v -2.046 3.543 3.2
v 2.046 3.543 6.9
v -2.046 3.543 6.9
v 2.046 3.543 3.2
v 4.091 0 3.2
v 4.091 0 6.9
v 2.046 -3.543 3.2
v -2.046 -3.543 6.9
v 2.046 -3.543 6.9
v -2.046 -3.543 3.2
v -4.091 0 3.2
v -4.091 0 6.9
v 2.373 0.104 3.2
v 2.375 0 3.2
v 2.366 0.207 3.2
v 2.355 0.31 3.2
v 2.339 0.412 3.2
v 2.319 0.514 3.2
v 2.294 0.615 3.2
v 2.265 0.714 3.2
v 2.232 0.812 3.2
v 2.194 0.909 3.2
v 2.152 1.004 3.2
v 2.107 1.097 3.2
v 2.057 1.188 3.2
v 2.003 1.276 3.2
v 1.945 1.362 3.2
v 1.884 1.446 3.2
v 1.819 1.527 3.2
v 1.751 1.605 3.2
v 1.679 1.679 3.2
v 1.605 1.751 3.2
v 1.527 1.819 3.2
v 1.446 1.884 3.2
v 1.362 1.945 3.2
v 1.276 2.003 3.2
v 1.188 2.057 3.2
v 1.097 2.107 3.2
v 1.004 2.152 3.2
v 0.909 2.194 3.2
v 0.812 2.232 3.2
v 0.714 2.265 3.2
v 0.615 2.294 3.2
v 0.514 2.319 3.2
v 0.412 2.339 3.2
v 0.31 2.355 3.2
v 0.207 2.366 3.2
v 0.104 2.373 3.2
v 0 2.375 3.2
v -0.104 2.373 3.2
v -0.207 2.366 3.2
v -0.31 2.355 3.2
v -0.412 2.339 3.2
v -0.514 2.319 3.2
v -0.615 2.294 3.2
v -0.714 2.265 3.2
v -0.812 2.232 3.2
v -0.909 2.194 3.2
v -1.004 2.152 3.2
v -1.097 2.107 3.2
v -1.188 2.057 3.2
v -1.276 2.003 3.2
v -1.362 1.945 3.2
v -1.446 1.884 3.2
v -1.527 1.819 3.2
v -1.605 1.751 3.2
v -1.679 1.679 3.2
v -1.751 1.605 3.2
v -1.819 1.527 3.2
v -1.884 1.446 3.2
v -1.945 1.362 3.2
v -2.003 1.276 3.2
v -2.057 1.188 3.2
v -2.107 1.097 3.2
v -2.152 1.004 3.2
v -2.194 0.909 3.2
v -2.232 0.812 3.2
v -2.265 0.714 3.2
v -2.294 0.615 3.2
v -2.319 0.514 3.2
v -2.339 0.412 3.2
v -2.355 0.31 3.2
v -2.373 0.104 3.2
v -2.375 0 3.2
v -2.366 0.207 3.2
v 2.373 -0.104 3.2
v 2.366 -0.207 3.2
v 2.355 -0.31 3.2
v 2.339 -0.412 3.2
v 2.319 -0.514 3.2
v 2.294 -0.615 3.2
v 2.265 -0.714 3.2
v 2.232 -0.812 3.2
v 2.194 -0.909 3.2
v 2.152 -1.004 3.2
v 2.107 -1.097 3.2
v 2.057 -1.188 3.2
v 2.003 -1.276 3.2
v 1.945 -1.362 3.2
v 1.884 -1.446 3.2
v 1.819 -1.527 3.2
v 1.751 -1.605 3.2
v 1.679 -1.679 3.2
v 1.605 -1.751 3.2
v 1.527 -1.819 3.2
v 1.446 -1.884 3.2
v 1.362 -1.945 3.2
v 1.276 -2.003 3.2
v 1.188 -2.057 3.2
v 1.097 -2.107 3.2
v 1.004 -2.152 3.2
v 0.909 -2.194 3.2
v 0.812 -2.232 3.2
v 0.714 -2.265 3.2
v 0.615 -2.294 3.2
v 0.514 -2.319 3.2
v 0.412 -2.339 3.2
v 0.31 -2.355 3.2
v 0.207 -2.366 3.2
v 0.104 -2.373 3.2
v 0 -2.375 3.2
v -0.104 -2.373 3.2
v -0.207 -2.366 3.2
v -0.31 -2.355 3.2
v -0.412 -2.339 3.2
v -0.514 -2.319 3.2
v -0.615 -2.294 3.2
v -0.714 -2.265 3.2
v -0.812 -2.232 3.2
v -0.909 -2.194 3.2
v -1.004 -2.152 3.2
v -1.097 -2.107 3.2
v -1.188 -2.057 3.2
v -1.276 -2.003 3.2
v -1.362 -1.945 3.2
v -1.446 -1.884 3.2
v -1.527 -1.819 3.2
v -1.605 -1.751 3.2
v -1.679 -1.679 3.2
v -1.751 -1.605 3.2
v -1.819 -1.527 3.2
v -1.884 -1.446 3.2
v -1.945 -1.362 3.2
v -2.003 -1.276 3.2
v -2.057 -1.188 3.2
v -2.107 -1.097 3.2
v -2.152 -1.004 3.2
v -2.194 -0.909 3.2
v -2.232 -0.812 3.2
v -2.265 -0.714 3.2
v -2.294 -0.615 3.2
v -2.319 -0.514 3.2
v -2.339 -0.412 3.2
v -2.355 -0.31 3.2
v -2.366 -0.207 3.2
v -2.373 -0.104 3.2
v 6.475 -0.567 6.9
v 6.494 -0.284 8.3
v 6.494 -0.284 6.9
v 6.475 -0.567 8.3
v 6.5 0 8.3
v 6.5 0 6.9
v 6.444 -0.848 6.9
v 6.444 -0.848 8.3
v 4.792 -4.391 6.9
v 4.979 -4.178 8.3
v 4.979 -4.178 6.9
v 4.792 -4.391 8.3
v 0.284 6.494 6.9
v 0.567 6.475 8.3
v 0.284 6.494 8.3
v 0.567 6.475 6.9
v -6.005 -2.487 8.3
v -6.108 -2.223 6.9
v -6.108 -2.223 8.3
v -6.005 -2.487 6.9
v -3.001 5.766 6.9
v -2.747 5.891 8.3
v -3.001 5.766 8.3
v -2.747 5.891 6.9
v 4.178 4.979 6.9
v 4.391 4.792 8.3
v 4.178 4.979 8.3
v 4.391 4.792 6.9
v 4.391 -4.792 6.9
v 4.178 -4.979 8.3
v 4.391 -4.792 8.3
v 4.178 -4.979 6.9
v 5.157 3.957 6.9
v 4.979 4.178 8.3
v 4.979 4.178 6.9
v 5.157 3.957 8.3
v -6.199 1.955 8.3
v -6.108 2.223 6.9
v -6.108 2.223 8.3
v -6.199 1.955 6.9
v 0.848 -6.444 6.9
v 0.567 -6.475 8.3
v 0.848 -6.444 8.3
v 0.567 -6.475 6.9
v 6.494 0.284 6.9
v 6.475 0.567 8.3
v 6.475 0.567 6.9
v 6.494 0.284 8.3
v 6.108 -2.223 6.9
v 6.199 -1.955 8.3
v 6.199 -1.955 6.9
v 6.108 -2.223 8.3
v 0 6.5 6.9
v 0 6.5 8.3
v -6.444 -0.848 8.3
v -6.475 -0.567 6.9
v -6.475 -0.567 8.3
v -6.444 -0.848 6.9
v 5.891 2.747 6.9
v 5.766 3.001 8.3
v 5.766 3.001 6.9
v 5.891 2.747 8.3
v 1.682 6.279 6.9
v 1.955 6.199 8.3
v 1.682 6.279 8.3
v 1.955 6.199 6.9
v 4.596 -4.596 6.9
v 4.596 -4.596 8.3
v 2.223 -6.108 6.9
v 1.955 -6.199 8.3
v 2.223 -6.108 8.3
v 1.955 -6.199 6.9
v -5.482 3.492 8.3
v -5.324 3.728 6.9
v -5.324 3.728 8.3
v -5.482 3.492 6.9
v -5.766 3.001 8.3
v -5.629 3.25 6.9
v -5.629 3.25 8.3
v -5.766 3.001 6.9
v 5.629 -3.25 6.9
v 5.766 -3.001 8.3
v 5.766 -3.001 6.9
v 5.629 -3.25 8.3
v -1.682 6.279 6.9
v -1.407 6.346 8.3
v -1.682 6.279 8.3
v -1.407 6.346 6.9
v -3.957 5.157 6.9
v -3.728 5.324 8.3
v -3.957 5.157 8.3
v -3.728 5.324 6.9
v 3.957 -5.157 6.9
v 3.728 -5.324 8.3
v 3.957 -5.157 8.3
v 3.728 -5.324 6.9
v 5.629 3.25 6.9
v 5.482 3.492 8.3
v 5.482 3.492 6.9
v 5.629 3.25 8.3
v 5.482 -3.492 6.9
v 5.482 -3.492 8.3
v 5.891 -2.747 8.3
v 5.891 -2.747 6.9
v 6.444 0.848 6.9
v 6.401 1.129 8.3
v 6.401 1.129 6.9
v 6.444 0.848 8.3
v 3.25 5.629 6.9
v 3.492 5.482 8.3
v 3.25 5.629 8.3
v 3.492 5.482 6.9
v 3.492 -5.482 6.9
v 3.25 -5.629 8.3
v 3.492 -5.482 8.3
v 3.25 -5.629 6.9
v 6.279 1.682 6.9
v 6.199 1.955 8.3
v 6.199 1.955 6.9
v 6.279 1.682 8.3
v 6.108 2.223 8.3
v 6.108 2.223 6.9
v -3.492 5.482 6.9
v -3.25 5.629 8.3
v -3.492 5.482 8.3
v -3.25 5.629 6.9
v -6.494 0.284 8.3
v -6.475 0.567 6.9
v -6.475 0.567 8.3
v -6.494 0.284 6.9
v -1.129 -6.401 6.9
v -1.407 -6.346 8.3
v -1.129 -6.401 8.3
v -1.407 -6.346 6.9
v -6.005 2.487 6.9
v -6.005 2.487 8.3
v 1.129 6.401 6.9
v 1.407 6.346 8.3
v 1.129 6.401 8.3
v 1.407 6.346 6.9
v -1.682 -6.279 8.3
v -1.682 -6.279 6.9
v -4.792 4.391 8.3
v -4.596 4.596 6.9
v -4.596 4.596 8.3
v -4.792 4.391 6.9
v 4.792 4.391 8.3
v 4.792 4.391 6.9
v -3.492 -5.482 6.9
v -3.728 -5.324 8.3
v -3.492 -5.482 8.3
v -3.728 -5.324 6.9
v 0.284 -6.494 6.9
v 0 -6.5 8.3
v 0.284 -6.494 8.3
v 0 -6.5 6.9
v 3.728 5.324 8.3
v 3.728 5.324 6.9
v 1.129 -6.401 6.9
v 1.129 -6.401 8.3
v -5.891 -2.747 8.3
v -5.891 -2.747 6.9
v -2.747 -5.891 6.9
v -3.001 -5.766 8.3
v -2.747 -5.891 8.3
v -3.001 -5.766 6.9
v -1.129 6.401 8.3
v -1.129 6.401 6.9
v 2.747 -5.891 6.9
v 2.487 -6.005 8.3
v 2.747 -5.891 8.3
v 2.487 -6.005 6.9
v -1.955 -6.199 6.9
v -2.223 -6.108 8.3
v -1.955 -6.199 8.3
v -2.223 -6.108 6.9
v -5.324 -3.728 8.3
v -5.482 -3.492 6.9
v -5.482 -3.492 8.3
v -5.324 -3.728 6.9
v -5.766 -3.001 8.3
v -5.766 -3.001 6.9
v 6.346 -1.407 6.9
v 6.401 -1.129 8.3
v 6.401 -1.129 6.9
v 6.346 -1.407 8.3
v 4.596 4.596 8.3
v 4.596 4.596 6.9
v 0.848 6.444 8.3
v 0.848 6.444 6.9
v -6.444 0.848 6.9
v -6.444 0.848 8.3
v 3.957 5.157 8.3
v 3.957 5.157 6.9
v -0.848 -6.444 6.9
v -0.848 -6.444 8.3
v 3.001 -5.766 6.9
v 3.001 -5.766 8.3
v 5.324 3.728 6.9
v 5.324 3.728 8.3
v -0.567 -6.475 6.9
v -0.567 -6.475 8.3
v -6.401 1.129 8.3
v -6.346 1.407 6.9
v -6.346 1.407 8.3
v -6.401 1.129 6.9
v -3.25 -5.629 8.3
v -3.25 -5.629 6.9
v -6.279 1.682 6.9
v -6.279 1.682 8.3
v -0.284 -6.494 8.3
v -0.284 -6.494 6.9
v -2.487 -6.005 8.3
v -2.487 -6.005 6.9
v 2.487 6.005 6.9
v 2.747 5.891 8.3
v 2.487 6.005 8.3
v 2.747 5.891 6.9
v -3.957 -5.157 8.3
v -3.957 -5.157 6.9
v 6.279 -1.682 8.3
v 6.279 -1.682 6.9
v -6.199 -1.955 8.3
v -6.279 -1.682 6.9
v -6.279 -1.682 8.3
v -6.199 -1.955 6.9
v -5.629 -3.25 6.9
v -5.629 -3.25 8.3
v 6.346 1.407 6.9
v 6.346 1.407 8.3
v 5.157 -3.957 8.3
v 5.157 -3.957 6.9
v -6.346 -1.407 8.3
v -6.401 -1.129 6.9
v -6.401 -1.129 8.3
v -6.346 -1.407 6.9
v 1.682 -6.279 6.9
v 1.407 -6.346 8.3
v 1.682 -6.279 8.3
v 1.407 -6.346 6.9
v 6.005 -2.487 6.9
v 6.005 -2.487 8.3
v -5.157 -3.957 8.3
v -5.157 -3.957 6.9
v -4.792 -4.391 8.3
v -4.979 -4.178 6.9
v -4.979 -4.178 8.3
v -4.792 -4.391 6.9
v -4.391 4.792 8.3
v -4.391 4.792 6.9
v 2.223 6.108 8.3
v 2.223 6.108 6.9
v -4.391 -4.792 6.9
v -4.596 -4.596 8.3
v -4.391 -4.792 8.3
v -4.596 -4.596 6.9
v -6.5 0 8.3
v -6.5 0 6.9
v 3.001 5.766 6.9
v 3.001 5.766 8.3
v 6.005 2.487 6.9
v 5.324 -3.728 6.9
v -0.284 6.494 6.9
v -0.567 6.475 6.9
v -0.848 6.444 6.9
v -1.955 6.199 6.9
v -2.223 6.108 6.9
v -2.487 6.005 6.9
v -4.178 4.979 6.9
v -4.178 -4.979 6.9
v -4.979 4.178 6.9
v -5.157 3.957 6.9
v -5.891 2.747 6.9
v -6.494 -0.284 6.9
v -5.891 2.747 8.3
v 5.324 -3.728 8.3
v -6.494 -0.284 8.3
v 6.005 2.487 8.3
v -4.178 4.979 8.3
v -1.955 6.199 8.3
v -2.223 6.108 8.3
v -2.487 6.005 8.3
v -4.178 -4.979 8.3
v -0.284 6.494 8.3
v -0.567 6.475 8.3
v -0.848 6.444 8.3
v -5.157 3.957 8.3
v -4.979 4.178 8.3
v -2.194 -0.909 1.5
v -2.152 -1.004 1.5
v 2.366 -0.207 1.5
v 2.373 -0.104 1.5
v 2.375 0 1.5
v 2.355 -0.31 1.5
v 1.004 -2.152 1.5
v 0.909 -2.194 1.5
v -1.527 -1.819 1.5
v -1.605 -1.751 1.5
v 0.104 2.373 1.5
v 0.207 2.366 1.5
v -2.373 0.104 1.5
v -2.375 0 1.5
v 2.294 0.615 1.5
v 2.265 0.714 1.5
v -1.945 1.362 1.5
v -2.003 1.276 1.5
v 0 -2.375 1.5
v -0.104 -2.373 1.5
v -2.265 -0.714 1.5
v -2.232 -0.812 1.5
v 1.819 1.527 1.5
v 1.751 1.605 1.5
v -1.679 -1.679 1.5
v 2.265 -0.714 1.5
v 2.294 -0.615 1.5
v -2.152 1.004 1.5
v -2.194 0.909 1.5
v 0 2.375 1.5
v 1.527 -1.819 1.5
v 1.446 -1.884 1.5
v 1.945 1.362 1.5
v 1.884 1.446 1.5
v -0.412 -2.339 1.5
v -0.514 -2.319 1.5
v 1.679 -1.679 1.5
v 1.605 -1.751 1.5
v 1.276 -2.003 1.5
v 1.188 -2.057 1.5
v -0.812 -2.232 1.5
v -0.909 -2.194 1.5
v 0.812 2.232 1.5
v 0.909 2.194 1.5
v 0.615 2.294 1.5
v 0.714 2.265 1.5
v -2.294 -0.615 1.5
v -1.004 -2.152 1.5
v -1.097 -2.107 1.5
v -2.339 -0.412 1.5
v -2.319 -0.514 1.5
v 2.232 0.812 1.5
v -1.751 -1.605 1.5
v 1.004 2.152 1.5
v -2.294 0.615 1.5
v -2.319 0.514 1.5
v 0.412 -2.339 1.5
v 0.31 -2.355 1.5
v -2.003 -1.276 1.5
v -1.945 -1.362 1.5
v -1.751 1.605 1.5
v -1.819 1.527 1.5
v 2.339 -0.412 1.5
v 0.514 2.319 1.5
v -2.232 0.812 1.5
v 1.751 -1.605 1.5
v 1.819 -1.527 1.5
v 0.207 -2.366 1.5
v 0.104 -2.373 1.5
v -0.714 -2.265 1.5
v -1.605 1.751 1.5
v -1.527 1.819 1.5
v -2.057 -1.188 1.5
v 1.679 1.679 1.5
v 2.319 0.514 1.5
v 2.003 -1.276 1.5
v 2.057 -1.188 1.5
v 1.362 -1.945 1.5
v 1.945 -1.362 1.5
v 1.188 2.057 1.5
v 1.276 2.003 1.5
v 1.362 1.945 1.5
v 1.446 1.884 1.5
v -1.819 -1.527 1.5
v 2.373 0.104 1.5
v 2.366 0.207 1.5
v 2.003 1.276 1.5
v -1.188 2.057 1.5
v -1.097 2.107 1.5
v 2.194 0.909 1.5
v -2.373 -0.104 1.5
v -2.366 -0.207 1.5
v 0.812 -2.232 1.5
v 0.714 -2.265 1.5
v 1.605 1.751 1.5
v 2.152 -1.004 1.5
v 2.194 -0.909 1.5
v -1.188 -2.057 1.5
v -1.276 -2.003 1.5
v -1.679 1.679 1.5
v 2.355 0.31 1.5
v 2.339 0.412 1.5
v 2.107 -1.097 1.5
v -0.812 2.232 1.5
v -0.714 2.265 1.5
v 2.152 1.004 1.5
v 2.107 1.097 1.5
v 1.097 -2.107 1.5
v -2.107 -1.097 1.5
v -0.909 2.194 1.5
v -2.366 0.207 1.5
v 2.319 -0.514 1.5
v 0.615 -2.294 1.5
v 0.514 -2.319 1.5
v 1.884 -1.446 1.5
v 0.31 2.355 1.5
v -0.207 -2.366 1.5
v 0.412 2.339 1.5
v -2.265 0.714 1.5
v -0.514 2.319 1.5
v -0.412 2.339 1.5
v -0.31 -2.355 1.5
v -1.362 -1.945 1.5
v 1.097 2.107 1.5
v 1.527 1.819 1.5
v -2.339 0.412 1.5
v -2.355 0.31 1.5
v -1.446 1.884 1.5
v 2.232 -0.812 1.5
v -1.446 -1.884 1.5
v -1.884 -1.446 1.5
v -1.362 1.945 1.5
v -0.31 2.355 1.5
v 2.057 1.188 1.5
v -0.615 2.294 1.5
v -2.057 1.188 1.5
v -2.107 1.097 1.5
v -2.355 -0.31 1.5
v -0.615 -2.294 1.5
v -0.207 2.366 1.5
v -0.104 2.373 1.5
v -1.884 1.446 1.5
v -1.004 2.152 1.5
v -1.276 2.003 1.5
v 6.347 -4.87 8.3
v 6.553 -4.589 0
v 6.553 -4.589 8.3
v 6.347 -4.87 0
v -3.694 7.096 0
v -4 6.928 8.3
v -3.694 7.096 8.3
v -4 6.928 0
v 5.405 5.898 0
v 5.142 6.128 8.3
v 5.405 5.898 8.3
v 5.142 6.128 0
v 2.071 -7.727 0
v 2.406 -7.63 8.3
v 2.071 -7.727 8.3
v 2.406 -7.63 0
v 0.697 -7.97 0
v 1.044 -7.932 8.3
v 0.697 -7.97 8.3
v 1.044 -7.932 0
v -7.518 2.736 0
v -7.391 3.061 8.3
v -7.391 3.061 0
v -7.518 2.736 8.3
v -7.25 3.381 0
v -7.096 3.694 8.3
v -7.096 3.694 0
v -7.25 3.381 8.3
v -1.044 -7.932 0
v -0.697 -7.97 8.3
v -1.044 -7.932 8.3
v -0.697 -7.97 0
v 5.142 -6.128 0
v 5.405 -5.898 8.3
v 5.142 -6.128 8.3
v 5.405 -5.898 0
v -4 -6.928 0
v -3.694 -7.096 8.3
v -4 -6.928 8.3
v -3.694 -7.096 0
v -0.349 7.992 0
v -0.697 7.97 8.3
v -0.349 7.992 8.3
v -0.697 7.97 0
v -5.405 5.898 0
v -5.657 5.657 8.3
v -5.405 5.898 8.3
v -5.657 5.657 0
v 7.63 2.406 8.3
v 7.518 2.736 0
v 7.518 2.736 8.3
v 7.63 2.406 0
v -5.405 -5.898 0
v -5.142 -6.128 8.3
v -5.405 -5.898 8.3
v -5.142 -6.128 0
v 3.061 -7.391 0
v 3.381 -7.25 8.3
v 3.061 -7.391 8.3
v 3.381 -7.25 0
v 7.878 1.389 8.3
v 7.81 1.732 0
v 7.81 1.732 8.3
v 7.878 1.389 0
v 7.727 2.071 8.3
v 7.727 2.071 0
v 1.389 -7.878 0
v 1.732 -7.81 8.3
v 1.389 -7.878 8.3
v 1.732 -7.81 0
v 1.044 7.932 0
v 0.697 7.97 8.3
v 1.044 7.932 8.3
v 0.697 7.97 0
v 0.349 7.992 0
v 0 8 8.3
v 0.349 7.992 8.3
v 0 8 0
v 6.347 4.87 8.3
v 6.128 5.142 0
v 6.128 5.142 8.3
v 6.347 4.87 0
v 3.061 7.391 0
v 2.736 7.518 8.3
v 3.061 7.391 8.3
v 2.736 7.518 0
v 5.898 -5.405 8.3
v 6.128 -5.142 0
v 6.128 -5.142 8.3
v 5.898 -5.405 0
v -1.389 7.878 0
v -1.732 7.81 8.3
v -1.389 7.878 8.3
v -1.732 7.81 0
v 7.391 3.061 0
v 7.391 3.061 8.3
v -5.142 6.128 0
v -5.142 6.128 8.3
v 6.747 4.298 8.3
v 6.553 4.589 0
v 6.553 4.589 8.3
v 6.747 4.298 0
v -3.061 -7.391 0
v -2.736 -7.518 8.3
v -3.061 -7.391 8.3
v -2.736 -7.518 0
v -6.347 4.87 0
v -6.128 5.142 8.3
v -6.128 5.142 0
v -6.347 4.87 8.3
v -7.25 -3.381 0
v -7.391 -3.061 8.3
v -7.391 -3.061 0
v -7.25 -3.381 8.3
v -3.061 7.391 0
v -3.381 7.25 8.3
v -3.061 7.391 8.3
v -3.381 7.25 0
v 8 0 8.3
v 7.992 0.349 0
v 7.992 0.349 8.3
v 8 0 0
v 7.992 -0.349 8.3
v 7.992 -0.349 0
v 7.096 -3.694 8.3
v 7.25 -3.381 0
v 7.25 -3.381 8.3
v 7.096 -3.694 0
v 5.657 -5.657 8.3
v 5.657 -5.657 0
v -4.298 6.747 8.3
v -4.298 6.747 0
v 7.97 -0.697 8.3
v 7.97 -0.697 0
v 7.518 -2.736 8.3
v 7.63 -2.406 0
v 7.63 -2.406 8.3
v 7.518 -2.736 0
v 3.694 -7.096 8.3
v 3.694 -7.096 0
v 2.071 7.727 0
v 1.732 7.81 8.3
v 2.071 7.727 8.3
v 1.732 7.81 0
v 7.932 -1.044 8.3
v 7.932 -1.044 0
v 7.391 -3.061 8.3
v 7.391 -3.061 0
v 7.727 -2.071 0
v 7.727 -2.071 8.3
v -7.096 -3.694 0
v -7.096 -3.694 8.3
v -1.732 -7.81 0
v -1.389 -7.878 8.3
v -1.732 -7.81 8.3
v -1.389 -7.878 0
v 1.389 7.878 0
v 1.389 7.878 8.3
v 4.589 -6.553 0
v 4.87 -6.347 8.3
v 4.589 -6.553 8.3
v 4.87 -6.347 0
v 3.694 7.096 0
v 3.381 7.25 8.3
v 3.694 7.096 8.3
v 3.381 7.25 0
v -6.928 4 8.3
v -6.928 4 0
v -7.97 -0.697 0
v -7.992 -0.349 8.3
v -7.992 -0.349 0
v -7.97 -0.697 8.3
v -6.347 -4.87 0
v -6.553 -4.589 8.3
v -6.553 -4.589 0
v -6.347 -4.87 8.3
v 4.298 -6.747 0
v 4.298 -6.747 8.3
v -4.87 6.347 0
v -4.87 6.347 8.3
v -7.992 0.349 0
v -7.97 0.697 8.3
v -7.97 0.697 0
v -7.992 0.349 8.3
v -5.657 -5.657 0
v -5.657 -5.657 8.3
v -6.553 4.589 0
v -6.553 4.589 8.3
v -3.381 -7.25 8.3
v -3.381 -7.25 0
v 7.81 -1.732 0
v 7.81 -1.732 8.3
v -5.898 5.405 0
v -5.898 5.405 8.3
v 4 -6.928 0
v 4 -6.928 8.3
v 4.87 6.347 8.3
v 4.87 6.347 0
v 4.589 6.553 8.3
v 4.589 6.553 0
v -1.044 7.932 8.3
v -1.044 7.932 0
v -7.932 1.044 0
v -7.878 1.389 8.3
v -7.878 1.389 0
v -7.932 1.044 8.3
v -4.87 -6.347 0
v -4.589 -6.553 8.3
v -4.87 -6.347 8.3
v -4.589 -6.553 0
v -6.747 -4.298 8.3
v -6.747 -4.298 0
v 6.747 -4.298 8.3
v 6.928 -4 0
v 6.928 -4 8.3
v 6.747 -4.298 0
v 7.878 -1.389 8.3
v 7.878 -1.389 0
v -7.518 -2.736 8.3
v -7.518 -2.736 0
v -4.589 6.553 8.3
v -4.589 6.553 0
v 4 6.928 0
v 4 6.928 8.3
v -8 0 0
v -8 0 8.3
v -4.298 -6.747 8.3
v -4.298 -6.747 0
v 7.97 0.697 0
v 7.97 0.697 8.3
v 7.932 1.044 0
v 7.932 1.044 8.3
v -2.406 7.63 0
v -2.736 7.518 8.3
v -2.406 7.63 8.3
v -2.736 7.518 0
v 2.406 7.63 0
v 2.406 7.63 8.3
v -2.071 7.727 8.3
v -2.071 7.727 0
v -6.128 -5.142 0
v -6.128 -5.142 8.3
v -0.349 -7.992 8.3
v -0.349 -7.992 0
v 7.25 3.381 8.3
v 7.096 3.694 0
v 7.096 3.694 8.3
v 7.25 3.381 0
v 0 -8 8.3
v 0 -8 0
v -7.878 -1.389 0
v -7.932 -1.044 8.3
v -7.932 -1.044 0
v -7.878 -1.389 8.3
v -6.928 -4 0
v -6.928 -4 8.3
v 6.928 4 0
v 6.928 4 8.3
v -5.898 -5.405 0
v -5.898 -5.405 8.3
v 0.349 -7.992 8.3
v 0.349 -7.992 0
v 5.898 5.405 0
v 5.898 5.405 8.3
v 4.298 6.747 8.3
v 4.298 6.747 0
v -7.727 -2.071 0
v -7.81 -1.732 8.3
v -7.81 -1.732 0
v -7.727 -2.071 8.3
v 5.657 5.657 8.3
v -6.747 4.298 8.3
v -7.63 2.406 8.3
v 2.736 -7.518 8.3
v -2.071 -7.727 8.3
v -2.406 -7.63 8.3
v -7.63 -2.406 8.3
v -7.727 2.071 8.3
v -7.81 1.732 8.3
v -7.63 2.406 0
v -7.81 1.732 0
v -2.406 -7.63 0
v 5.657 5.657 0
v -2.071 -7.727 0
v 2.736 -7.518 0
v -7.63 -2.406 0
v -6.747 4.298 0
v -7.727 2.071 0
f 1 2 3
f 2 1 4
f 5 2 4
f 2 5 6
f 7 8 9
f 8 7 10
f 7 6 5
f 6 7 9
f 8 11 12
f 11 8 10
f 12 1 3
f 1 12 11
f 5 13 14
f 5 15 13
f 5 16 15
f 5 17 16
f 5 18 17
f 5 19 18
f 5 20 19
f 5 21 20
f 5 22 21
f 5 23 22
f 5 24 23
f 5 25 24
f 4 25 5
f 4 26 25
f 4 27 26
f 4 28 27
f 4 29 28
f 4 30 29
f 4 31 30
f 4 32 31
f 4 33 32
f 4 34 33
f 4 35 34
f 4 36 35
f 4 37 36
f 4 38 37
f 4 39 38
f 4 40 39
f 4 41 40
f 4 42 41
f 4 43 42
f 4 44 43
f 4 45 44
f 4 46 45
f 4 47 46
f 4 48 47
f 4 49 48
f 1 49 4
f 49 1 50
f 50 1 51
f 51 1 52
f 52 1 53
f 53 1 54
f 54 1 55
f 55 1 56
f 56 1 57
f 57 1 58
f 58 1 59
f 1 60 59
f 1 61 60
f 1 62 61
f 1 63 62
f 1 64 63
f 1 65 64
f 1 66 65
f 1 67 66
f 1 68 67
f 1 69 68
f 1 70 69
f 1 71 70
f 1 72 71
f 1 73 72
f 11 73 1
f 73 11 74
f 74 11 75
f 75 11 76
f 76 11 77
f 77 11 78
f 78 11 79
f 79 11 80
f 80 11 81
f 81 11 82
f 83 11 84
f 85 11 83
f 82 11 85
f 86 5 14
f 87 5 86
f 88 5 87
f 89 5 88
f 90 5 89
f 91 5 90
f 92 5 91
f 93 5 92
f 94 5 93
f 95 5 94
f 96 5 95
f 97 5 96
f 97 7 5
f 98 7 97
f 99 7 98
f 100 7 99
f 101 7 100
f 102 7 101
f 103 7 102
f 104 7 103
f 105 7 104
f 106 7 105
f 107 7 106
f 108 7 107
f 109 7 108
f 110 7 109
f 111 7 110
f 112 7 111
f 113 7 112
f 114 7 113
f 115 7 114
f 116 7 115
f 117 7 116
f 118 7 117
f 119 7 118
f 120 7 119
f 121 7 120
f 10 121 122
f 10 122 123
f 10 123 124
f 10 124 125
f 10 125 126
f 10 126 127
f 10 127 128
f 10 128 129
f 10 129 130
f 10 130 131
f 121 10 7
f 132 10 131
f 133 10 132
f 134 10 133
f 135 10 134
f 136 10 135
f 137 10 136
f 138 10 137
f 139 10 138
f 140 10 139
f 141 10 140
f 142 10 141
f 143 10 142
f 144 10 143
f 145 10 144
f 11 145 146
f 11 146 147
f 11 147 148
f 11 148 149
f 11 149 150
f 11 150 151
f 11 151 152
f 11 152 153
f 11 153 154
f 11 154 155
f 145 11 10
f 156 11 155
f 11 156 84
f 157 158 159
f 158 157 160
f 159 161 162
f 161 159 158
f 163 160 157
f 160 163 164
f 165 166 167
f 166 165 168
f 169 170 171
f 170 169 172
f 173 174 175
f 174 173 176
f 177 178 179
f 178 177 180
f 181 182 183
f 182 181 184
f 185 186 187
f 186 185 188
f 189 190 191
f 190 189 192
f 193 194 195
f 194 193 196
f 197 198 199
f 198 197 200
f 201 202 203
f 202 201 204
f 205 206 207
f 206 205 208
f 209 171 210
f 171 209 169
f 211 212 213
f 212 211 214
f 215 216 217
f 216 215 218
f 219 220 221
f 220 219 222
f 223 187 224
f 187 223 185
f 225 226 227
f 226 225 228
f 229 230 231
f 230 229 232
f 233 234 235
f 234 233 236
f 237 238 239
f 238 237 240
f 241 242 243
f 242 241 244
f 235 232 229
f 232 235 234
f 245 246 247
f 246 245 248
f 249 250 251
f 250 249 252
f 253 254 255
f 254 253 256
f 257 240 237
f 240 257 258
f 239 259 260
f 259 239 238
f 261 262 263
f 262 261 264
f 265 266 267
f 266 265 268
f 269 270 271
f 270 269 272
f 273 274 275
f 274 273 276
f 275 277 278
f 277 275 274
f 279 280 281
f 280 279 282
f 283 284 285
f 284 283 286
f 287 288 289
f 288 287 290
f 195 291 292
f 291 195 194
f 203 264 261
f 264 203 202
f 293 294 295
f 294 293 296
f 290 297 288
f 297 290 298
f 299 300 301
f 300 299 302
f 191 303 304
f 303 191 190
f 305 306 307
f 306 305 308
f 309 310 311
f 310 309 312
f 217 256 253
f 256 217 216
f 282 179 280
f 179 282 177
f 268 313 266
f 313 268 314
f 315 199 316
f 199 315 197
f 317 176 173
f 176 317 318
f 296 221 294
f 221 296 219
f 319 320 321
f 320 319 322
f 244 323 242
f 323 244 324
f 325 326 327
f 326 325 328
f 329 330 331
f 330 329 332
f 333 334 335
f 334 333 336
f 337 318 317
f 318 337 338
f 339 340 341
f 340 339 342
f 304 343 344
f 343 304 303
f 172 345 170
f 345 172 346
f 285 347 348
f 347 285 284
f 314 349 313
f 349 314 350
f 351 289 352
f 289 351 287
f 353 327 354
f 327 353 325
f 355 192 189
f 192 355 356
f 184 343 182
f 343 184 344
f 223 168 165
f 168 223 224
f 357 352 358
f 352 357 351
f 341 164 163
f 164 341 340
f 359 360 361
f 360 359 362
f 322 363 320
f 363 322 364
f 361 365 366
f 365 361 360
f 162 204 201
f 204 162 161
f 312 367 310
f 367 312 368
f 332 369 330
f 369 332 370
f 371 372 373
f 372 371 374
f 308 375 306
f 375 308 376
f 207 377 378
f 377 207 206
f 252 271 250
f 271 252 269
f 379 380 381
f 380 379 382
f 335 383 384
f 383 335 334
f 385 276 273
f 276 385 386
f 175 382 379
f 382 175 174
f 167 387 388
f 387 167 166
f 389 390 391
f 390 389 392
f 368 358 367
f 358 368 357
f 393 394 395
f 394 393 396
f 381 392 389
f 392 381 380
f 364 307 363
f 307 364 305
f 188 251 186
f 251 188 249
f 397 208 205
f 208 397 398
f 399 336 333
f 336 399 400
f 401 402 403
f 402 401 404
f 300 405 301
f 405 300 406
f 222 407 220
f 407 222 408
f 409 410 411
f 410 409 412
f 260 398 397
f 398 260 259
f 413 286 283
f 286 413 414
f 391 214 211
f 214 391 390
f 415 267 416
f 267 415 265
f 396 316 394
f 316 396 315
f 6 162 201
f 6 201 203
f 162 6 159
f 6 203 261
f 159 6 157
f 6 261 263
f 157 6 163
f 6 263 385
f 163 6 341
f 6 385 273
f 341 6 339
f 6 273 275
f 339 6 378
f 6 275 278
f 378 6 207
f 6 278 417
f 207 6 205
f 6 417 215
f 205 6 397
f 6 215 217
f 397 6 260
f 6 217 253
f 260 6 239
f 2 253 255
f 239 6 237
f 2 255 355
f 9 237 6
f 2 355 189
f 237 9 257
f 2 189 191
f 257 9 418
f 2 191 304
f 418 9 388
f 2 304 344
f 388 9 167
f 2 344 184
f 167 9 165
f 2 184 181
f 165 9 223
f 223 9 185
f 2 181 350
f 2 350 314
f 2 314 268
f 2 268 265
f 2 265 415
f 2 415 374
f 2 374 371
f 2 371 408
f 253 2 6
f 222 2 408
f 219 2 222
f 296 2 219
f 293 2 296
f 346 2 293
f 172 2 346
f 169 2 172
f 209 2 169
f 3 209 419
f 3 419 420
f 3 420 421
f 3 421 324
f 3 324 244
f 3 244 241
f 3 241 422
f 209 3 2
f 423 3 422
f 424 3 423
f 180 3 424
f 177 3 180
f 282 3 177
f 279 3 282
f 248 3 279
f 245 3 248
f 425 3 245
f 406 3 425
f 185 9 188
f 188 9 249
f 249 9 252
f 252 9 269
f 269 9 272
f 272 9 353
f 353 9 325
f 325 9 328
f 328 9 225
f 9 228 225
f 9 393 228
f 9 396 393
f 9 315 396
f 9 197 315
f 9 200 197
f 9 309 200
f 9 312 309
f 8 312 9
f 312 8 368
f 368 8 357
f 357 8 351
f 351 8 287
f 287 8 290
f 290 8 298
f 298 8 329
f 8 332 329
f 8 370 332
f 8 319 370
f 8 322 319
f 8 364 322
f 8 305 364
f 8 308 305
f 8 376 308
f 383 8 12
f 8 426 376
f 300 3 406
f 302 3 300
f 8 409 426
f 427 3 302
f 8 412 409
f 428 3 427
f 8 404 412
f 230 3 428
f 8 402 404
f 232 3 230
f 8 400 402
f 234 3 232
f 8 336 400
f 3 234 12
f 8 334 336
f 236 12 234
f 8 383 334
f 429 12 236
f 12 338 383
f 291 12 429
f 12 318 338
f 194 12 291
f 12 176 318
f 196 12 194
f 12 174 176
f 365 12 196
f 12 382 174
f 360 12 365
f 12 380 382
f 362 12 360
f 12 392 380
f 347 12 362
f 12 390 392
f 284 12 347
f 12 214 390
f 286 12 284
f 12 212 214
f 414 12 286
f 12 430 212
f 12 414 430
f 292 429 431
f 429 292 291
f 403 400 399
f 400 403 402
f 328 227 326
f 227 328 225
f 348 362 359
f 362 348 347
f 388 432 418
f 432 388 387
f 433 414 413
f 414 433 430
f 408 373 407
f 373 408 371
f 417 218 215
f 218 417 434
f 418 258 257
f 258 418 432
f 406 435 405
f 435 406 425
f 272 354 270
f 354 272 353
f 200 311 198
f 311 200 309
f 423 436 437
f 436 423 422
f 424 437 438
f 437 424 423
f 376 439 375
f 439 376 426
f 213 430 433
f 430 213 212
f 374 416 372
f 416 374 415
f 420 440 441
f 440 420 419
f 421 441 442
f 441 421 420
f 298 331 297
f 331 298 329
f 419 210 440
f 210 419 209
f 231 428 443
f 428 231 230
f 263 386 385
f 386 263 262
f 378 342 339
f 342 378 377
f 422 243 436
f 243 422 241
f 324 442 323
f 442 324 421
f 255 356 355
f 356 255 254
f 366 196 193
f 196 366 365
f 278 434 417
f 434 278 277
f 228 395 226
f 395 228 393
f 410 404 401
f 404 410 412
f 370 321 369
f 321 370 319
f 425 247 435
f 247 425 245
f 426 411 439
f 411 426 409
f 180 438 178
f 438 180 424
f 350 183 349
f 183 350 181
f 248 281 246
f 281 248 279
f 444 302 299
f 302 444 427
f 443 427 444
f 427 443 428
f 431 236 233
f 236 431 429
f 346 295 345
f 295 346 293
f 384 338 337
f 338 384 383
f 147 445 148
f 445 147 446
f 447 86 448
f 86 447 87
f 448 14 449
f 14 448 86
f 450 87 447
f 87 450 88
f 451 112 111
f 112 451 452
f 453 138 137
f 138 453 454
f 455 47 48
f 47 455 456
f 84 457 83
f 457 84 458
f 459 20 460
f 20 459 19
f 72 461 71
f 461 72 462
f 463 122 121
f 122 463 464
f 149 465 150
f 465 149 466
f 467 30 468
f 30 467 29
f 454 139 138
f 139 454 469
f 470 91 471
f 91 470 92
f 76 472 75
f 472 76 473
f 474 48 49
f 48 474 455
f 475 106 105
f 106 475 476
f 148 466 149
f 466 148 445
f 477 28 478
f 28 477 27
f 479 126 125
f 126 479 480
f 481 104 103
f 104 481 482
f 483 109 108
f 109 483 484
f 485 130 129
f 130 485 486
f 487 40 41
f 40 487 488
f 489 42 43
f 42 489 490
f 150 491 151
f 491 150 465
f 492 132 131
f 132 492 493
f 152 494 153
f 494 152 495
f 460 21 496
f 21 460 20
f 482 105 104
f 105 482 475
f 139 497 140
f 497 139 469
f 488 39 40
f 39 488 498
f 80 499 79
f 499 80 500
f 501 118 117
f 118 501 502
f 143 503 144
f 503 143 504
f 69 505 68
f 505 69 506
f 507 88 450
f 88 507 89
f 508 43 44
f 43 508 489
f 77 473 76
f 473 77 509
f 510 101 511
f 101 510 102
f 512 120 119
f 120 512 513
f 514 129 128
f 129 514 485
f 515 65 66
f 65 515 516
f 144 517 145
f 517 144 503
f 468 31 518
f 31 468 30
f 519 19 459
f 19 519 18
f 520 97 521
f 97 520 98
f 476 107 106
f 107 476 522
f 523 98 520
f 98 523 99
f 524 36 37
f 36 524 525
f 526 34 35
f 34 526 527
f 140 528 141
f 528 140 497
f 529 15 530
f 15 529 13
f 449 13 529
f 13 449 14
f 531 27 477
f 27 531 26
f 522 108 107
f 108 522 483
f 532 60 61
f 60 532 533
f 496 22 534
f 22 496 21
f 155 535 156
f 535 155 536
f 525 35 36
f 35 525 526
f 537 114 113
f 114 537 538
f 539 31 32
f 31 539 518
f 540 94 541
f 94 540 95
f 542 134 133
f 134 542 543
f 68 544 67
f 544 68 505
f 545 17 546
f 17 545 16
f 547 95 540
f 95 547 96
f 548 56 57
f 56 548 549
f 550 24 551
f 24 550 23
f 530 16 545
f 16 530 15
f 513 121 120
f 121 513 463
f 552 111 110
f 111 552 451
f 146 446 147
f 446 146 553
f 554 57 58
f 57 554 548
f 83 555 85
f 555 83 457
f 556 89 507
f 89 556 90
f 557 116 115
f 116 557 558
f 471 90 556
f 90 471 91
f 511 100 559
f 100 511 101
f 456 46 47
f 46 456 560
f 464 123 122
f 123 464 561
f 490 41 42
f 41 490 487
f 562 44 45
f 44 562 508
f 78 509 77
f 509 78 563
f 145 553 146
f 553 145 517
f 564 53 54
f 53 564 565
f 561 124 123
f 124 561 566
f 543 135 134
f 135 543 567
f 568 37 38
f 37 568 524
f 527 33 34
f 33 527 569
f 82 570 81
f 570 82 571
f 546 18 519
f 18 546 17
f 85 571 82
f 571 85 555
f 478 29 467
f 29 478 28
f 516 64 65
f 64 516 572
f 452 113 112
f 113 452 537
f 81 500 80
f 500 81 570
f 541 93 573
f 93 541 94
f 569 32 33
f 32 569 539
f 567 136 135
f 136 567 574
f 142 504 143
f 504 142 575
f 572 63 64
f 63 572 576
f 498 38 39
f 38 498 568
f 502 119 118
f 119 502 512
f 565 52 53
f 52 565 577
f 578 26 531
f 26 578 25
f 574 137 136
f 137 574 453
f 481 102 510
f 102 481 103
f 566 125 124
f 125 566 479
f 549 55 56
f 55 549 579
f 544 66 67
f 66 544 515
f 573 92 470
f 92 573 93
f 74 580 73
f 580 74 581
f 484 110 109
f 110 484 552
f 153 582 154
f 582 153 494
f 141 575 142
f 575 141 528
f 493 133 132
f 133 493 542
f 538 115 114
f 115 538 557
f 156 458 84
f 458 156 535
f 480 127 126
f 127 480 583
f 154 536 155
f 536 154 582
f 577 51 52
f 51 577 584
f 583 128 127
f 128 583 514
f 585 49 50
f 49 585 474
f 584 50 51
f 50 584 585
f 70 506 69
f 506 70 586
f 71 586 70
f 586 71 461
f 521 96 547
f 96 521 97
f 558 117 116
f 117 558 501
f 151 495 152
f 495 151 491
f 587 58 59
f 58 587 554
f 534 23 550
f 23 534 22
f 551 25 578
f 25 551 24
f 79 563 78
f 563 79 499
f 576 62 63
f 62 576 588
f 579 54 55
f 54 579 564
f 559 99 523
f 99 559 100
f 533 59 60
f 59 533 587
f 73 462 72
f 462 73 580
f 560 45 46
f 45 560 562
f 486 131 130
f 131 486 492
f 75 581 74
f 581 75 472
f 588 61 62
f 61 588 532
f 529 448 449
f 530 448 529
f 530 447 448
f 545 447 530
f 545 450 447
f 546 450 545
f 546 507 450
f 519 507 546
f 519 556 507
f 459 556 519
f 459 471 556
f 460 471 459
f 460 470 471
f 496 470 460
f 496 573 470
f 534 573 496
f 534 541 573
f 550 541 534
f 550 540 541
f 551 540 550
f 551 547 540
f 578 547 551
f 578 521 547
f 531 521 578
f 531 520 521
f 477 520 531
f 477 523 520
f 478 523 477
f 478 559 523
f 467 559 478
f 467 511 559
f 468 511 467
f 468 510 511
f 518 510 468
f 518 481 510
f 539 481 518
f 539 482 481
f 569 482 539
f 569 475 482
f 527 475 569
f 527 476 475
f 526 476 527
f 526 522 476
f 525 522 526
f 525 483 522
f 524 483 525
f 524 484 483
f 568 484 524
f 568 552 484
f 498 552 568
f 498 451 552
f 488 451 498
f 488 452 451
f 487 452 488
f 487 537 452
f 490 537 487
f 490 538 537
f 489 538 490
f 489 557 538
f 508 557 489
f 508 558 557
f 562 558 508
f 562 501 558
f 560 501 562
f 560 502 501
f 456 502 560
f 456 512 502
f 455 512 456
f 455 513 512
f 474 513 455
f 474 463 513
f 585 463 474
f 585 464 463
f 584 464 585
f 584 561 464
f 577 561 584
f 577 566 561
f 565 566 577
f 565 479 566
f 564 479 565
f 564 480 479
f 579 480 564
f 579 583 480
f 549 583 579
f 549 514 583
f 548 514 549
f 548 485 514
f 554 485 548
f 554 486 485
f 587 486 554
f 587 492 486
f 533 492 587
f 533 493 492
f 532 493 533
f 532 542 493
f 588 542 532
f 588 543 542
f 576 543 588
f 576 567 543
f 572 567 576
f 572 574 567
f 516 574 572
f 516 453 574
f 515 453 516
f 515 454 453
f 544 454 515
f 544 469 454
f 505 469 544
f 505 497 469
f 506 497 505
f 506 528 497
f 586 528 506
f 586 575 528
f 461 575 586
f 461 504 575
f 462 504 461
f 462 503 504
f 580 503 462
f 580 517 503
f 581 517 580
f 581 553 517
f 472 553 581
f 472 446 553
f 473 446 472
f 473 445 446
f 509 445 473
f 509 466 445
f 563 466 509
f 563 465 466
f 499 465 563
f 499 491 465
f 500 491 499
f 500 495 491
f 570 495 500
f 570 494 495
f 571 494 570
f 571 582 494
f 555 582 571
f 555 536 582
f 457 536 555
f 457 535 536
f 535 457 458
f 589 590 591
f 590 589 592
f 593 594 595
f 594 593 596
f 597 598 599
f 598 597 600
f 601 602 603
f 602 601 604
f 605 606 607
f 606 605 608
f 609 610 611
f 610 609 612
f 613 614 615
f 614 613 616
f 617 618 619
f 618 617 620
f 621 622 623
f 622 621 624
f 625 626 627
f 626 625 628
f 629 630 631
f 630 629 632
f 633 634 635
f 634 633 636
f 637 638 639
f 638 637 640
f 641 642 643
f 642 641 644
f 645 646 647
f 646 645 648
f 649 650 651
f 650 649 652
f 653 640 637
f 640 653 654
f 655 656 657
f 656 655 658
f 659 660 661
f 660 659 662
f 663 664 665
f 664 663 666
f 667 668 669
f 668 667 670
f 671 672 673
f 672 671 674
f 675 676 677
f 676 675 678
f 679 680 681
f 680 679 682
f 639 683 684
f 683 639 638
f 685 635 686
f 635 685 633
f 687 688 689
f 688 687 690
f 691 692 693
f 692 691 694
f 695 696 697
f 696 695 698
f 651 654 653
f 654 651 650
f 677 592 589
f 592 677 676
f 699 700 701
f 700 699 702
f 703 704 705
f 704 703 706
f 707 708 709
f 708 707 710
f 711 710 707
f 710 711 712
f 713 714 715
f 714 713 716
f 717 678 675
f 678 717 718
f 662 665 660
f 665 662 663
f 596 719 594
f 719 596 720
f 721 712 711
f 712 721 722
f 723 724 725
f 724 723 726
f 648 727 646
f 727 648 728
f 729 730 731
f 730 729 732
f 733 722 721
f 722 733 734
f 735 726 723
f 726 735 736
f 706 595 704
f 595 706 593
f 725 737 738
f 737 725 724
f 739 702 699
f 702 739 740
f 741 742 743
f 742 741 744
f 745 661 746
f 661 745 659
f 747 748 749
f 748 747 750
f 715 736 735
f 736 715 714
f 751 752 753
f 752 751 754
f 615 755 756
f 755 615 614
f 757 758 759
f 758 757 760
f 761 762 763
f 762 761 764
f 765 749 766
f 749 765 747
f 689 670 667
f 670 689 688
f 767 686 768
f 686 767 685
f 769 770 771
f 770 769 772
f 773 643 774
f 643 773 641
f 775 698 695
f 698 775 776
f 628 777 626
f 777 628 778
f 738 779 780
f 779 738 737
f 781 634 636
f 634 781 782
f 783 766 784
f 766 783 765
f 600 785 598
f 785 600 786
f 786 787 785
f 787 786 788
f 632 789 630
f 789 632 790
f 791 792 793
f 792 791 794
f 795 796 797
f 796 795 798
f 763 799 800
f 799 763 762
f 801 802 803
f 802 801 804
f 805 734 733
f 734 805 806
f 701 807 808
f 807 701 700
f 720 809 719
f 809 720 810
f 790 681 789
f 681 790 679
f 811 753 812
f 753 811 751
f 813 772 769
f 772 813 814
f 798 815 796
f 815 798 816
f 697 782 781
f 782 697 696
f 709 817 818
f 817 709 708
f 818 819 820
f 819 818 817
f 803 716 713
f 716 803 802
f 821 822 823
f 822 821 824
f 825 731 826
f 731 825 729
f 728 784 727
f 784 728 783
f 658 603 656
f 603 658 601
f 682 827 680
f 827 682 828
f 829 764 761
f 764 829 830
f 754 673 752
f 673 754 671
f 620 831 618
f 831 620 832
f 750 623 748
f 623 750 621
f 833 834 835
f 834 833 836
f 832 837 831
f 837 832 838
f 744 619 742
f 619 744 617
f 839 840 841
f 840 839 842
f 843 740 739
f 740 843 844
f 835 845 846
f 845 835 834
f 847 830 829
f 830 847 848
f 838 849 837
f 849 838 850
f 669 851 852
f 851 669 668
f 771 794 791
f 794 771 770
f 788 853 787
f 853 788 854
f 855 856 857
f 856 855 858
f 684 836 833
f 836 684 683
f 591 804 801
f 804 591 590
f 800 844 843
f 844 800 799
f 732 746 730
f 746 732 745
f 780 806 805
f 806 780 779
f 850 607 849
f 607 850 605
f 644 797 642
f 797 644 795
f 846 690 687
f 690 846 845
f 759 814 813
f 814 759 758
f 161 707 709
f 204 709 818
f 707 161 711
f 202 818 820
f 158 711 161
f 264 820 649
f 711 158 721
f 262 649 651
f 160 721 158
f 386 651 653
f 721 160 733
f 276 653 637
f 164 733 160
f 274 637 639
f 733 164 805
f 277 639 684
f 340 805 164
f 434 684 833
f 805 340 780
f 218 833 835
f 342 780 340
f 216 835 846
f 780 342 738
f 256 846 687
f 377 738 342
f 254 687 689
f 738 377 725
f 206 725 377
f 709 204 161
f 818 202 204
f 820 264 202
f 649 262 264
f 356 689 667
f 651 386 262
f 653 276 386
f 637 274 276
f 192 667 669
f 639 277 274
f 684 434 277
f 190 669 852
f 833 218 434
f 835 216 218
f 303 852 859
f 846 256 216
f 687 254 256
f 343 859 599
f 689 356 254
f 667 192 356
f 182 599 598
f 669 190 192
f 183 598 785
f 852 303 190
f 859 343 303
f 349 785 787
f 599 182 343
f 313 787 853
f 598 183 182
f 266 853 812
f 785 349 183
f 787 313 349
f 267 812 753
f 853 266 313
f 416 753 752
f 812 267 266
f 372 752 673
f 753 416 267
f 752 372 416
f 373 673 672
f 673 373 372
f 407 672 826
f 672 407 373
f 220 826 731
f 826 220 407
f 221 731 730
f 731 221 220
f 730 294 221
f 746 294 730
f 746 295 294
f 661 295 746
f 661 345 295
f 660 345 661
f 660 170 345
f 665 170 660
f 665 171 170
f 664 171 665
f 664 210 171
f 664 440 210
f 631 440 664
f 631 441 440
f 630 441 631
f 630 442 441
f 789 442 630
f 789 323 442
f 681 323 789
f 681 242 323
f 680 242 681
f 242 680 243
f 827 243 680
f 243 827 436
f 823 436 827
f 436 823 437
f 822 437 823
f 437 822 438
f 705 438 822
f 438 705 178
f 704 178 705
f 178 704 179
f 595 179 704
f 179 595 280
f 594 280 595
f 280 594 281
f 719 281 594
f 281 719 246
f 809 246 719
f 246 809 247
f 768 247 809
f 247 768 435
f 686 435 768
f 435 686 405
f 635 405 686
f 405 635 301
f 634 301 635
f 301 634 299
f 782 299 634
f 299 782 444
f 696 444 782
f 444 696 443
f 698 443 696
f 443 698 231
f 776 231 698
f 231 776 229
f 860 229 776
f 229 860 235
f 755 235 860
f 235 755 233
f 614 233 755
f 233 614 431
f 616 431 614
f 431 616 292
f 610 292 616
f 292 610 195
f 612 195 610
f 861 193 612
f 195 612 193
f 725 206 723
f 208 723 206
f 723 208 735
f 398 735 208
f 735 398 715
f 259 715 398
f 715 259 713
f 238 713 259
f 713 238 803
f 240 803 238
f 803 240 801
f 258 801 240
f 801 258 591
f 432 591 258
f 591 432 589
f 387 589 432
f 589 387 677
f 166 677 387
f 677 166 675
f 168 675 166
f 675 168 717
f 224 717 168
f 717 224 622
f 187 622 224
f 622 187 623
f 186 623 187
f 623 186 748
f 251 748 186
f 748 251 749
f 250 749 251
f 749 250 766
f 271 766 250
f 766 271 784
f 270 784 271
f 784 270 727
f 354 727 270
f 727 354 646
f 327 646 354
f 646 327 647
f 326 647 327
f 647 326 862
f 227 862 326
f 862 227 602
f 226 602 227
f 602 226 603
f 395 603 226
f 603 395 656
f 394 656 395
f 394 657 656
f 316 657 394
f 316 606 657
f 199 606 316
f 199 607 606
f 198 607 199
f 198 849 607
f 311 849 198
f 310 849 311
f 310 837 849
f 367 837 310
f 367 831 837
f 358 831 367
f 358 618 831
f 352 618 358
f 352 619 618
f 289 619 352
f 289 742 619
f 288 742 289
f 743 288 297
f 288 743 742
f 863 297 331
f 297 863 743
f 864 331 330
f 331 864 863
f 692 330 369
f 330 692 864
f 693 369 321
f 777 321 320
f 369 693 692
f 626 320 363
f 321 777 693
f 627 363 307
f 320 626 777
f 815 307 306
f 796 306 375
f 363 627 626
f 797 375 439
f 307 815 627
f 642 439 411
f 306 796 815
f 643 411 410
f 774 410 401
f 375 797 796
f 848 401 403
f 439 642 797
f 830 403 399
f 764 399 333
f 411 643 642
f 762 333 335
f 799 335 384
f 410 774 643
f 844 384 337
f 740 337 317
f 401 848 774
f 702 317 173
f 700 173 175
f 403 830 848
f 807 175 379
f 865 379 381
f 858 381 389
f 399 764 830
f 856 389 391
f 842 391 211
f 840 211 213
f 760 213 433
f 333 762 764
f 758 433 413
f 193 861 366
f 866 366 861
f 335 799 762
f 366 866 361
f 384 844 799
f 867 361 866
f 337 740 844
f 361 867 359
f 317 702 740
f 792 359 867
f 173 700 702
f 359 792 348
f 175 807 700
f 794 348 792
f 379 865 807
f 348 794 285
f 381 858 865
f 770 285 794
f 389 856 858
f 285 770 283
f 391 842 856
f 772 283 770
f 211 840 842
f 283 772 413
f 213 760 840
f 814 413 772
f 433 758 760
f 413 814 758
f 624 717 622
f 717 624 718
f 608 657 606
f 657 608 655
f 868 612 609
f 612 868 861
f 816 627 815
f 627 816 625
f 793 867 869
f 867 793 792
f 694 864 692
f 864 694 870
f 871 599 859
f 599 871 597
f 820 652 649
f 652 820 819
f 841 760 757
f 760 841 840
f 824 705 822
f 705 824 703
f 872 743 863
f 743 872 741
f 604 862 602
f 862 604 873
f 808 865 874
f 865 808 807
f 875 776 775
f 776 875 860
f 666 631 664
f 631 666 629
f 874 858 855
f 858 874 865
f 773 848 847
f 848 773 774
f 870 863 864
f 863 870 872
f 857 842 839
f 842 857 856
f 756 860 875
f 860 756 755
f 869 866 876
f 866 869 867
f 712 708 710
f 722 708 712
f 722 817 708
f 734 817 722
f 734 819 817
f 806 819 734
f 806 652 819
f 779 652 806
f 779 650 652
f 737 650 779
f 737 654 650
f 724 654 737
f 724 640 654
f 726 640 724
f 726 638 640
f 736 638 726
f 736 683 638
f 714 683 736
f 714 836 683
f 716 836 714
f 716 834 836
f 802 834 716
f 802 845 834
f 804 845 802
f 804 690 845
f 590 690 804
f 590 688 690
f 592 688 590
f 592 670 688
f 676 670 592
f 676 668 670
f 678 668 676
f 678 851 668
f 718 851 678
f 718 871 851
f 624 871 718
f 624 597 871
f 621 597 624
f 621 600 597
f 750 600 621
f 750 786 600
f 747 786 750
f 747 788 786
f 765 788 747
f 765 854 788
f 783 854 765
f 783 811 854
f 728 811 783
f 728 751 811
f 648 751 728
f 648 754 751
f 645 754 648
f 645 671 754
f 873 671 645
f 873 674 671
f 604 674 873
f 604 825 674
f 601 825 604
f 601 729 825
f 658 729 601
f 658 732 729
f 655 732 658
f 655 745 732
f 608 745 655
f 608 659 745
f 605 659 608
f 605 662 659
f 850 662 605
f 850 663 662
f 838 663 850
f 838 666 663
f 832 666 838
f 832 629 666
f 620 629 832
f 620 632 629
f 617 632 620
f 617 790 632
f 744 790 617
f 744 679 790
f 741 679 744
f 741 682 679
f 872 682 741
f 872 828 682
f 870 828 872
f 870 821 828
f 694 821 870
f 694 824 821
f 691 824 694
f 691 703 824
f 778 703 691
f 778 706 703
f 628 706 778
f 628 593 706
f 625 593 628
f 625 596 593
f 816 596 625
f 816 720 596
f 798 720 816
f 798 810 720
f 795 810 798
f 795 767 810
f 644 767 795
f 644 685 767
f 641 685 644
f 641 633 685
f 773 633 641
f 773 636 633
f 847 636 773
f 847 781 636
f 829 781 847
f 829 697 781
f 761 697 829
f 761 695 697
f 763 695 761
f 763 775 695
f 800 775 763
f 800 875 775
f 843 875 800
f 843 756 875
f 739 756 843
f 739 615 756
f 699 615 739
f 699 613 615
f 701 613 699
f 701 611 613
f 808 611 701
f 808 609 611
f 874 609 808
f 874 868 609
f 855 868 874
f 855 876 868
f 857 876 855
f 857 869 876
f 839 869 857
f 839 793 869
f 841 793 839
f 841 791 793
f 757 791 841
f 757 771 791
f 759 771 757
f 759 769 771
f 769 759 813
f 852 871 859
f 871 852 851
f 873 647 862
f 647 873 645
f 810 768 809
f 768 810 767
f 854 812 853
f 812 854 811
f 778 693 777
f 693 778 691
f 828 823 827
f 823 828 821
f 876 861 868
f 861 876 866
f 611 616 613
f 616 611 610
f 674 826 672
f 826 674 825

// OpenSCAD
// file: ../utils/screw_it.scad
// Example
$fn=36;
translate([50, 0, 0])
screw_foot(20, 50, 5, 4.5, 7, 3);

countersunk_screw_cutout(16.5, 4, 4, 7.9, epsilon=1); // Spax 4x16

// Nut traps ("Hutkappe" fuer Sechskantschrauben)
module nut_trap(s, h, epsilon=0.1)
{
    // Compute the radius via equilateral triangles
    // height (i.e. s/2) = sqrt(3)/2 * side (i.e. the radius)
    cylinder(r = s / sqrt(3) + epsilon/2, h=h, $fn=6);
}
module nut_trap_m3(height, epsilon=0.1) { nut_trap(5.5, height, epsilon); }
module nut_trap_m4(height=3.2, epsilon=0.1) { nut_trap(7, height, epsilon); }
module nut_trap_m5(height, epsilon=0.1) { nut_trap(8, height, epsilon); }
module nut_trap_m6(height, epsilon=0.1) { nut_trap(10, height, epsilon); }
module nut_trap_m8(height, epsilon=0.1) { nut_trap(13, height, epsilon); }
module nut_trap_m10(height, epsilon=0.1) { nut_trap(17, height, epsilon); }

// Cutout for countersunk screws.
// Takes care of the top/bottom padding needed when subtracting shapes
module countersunk_screw_cutout(height_total, height_head, diameter_screw, diameter_head, , epsilon=1)
{
    // Requires OpenSCAD 2019.05 assert(height_head + 1 <= height_total, "Total height must be at least head + 1");
    $fn = 72;
    height_screw = height_total - height_head;
    translate([0, 0, -epsilon])
    cylinder(d=diameter_screw, h=height_screw+epsilon+height_head/2.0, center=false); // +height_head/2 to ensure connected shape
    
    if (epsilon > 0)
    {
        // Compute diameter for epsilon-padded height (similar triangles to the rescue)
        r1 = diameter_screw/2.0;
        r2 = diameter_head/2.0;
        r_ext = r1 + (height_head + epsilon) * (r2 - r1) / height_head;
        
        translate([0, 0, height_screw])
        cylinder(d1=diameter_screw, d2=2*r_ext, h=height_head+epsilon, center=false);
    }
    else
    {
        translate([0, 0, height_screw])
        cylinder(d1=diameter_screw, d2=diameter_head, h=height_head, center=false);
    }
}

// "Lasche" - simple extension for a model to tighten it via screws - has a rounded top + countersunk screw cutout
module screw_foot(width, length, height, diameter_screw, diameter_countersunk, height_countersunk)
{
    cube_length = length - width / 2;
    difference()
    {
        union()
        {
            cube([width, cube_length, height], center=false);
            translate([width/2, cube_length, 0])
            cylinder(d=width, h=height, center=false);
        }

        translate([width/2, cube_length, -1])
        cylinder(d=diameter_screw, h=height+2, center=false);
            
        // New diameter via similar triangles (potentially shorter side is d_countersunk-d_screw)
        s = (height_countersunk+1) / height_countersunk * (diameter_countersunk-diameter_screw);
        d_top = diameter_screw + s;

        translate([width/2, cube_length, height-height_countersunk])
        cylinder(d1=diameter_screw, d2=d_top, h=height_countersunk+1, center=false);
    }
}
// main file
use <../utils/screw_it.scad>

module trap(thickness=1.5,
    dia_shim = 12 + 1.0,
    height_shim = 1.1+0.3,
    height_nut = 3.2 + 0.5,
    height_screw = 6.8)
{
    $fn=144;

    H = height_screw+thickness;
    translate([0, 0, H/2])
    rotate([180, 0, 0])
    translate([0, 0, -H/2])
    difference()
    {
        cylinder(d=dia_shim + 2*thickness, h=H);
        
        union()
        {
            translate([0, 0, height_shim-0.1])
            nut_trap_m4(height_nut+0.1);
            translate([0, 0, -0.1])
            cylinder(d=dia_shim, h = height_shim +0.1);
            
            cylinder(d=4.75, h = height_screw);
        }
    }
}

module trap_hook(thickness_trap=1.5,
    dia_shim = 12 + 1.0,
    height_shim = 1.1 +0.3,
    height_nut = 3.2 + 0.5,
    height_screw = 6.8,
    hook_width = 0.5,
    hook_length = 12,
    hook_thickness = 3)
{
    $fn=144;

    trap(thickness_trap, dia_shim, height_shim, height_nut, height_screw);
    
    dia_outer = dia_shim+2*thickness_trap;
    width_hook = hook_width*dia_outer;
    cube_offset = hook_length+dia_outer/2-width_hook/2;
    translate([-width_hook/2, 0, 0])
    cube([width_hook, cube_offset, hook_thickness]); //TODO
    
    translate([0, cube_offset, 0])
    cylinder(d=width_hook, h=hook_thickness);
}

//translate([20, 0, 0])
trap();

//trap_hook(height_screw = 8.8, hook_width=0.75, hook_length=12);
